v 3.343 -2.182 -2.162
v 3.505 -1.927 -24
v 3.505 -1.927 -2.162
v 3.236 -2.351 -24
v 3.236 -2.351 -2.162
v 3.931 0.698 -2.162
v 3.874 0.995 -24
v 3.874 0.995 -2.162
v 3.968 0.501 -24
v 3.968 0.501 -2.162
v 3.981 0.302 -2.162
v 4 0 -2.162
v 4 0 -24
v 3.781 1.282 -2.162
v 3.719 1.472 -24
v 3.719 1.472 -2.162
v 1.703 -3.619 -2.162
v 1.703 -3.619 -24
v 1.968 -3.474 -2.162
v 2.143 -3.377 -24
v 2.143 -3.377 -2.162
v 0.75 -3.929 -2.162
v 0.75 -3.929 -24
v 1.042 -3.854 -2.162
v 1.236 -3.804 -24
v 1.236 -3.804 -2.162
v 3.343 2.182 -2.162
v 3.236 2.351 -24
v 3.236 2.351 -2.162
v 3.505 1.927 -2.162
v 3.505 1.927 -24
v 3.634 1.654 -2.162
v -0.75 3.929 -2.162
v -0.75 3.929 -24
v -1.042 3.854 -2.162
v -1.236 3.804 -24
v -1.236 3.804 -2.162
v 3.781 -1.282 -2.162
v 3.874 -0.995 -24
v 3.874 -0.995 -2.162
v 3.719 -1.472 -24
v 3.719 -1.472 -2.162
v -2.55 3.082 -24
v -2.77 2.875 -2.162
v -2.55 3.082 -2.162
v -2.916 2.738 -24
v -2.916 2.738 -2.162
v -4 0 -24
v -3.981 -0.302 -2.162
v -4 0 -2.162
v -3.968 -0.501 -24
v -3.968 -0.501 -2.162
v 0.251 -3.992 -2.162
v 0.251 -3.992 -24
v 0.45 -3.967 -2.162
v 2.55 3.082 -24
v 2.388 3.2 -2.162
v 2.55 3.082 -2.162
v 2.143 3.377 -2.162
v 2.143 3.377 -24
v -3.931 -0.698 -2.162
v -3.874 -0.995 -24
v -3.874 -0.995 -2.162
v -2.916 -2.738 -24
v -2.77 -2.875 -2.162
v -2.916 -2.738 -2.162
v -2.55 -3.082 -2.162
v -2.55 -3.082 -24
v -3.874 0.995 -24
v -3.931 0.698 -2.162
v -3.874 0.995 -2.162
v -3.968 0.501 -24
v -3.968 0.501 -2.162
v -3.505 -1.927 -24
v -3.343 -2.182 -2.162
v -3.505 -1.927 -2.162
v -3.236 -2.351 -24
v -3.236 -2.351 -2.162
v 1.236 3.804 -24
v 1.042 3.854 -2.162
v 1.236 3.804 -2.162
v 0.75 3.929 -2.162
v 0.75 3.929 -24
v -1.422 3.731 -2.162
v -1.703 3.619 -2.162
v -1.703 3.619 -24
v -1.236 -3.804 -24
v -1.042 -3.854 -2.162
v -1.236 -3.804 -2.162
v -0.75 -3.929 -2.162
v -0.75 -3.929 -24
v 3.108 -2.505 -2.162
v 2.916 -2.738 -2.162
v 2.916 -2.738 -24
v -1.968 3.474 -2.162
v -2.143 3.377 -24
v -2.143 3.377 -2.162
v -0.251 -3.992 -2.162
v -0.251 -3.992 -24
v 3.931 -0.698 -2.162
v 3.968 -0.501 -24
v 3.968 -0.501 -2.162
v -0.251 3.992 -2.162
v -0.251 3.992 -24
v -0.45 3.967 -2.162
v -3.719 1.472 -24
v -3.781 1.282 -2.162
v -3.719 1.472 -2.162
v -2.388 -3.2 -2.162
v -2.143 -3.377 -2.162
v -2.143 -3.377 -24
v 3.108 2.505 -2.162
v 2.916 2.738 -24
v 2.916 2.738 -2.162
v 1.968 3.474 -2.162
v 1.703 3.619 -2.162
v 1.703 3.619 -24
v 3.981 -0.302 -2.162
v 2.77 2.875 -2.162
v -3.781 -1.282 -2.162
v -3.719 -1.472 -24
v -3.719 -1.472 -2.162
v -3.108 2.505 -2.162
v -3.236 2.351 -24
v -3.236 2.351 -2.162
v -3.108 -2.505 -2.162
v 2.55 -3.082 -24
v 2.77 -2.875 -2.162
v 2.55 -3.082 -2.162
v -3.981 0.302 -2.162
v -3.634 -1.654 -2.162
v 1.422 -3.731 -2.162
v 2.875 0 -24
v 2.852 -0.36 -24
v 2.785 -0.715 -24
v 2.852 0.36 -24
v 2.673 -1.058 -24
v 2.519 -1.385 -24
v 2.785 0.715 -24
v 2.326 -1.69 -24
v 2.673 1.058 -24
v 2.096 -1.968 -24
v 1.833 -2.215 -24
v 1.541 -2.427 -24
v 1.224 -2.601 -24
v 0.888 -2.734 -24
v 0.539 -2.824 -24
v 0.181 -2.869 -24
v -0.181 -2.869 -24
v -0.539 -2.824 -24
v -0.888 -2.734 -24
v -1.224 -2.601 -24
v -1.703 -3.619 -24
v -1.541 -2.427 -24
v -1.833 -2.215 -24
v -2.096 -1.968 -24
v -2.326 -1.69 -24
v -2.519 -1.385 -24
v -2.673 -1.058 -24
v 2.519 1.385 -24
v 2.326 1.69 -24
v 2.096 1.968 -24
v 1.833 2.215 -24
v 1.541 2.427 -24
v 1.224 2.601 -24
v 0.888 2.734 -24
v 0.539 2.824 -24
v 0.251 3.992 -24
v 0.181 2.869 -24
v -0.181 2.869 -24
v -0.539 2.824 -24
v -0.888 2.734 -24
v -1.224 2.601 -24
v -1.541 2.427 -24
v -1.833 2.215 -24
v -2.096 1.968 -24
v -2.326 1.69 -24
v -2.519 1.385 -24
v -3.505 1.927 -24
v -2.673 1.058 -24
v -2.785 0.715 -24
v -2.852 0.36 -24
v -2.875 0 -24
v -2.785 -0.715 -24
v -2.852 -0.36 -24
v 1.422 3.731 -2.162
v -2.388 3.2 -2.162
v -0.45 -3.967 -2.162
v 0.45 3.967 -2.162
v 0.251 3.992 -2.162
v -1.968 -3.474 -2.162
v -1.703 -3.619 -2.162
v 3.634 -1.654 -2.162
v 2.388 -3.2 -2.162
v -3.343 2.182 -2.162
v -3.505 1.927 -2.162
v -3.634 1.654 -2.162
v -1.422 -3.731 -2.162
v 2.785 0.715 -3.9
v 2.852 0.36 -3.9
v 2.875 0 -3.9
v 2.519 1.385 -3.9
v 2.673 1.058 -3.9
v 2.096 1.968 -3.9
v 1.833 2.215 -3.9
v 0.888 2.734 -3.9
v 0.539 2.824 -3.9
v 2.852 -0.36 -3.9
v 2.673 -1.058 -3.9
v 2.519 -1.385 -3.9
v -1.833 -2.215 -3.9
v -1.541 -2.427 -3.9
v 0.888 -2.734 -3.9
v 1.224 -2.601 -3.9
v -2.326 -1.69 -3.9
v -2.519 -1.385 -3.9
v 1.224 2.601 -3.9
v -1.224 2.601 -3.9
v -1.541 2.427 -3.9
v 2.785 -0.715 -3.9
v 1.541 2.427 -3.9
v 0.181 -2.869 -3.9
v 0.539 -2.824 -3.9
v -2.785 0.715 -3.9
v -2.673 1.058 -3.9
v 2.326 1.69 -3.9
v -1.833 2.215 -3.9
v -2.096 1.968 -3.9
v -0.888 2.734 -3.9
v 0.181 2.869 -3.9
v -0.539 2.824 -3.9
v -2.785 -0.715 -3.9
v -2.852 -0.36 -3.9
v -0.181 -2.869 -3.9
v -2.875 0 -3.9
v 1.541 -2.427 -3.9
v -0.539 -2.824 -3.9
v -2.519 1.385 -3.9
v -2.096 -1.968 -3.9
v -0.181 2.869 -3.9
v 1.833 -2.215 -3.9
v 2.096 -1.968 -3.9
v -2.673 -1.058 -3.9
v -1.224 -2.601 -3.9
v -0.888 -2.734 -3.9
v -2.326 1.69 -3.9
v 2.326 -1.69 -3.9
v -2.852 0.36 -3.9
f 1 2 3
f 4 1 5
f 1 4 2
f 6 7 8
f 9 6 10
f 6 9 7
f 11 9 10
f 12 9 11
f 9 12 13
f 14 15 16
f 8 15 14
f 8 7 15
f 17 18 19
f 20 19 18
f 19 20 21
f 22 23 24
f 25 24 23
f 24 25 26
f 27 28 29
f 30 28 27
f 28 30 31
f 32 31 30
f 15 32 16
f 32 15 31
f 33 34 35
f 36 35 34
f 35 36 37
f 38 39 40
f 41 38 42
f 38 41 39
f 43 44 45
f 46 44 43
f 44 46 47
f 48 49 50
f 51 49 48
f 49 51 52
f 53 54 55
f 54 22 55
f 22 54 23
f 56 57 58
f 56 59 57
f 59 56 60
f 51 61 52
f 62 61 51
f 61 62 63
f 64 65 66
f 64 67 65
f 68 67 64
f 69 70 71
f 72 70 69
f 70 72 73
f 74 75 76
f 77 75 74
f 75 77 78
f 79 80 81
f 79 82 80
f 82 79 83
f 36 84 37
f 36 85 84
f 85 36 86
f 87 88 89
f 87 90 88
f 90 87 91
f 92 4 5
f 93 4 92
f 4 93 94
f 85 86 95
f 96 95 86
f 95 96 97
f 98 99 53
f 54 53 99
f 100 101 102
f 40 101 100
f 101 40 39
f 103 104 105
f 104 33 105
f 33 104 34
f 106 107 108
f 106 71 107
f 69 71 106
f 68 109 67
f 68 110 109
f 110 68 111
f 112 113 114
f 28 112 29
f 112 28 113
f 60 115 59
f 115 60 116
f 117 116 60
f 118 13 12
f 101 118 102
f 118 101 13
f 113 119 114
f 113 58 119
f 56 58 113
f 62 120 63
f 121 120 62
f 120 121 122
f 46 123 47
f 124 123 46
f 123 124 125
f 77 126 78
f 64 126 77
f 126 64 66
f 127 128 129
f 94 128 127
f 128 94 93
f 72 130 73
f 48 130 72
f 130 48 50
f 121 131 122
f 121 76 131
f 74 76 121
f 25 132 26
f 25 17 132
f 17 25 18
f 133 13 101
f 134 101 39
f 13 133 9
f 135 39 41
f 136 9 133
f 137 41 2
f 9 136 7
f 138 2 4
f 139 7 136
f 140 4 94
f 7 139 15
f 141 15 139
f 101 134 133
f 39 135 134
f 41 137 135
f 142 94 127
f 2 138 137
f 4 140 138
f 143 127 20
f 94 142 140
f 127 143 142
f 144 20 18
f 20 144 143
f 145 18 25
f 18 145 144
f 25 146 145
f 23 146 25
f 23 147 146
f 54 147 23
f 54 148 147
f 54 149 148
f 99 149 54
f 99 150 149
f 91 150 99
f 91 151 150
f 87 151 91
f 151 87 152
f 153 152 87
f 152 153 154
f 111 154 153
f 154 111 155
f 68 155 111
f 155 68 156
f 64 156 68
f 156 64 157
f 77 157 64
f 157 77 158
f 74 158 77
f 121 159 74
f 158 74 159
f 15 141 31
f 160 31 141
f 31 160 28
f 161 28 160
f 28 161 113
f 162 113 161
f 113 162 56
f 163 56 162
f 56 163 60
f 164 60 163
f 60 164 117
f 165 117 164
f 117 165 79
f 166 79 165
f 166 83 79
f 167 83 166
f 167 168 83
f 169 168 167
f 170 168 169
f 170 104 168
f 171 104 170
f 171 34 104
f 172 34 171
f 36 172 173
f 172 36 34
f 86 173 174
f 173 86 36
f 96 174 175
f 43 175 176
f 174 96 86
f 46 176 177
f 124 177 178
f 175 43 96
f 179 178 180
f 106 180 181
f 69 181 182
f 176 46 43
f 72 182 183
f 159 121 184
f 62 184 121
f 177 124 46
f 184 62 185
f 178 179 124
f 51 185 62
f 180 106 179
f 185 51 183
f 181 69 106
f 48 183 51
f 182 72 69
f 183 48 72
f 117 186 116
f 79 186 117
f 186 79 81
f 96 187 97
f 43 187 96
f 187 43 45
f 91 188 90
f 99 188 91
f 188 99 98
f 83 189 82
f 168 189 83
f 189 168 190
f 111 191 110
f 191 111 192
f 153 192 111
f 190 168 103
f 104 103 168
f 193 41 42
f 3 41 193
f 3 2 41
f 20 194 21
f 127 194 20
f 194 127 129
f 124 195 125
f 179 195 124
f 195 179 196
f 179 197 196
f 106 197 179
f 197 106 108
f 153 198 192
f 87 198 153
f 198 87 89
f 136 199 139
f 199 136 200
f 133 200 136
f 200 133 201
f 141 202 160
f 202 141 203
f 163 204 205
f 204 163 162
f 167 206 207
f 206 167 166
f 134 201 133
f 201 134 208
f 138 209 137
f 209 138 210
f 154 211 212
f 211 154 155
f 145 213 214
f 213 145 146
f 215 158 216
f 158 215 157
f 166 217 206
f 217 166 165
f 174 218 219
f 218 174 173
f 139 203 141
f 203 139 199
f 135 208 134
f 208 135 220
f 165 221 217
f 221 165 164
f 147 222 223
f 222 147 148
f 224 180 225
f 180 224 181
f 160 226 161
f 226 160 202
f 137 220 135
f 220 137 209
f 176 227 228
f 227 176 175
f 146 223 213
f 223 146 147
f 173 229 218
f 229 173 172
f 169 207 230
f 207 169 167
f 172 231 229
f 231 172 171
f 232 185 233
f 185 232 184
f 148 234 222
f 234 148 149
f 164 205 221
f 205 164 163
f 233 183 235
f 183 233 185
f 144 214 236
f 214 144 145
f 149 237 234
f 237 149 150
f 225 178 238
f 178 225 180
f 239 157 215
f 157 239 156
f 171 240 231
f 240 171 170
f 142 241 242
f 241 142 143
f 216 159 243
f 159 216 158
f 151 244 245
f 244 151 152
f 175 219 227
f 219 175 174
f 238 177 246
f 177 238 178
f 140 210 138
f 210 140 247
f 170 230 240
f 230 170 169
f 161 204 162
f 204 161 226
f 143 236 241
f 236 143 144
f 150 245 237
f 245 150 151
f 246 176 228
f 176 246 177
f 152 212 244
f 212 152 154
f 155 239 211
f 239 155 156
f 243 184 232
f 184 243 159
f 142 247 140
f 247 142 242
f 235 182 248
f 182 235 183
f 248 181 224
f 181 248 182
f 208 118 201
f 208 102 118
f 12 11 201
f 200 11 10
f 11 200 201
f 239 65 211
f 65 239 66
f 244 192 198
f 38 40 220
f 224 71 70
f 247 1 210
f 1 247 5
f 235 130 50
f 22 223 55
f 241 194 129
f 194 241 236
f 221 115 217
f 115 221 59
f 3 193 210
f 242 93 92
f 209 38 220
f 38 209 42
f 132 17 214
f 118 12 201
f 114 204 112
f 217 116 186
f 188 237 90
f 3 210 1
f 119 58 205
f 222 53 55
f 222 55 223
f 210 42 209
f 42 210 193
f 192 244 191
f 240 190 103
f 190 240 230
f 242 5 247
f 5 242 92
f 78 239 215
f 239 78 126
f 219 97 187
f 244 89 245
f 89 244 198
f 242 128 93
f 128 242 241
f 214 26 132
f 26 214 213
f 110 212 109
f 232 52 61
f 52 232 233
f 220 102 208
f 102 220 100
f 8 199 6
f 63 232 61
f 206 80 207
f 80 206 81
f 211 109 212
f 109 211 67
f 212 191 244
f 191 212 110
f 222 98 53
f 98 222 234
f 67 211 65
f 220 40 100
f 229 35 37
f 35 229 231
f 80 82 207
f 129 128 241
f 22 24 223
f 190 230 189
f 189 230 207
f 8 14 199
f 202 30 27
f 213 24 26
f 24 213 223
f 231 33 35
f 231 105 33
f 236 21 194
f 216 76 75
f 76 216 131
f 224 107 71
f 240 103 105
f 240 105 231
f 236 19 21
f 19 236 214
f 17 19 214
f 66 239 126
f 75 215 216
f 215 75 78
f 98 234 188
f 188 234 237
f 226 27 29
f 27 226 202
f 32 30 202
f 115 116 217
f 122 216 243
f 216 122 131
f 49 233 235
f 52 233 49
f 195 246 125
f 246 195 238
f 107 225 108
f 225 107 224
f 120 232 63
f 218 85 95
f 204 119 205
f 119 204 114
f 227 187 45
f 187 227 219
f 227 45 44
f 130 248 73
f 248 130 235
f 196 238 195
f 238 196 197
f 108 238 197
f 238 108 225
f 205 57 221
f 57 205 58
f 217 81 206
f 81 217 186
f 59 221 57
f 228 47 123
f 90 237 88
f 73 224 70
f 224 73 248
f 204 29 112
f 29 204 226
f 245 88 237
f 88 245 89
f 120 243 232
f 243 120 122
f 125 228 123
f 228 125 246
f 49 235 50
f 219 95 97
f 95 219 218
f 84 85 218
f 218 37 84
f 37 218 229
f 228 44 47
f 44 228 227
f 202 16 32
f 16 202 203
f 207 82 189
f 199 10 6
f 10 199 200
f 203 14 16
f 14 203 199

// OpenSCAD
$fn = 50;

difference() {
	union() {
		translate(v = [0, 0, -24.0]) {
			cylinder(h = 24, r = 4.0);
		}
		#translate(v = [0, 0, -27.0]) {
			cylinder(h = 27, r = 2.875);
		}
	}
	union() {
		translate(v = [0, 0, 0]) {
			rotate(a = [0, 0, 0]) {
				difference() {
					union() {
						translate(v = [0, 0, -27.0]) {
							cylinder(h = 27, r = 2.6);
						}
						translate(v = [0, 0, -3.9]) {
							cylinder(h = 3.9, r1 = 2.875, r2 = 5.4);
						}
						translate(v = [0, 0, -27.0]) {
							cylinder(h = 27, r = 2.875);
						}
						translate(v = [0, 0, -27.0]) {
							cylinder(h = 27, r = 2.6);
						}
					}
					union();
				}
			}
		}
	}
}
